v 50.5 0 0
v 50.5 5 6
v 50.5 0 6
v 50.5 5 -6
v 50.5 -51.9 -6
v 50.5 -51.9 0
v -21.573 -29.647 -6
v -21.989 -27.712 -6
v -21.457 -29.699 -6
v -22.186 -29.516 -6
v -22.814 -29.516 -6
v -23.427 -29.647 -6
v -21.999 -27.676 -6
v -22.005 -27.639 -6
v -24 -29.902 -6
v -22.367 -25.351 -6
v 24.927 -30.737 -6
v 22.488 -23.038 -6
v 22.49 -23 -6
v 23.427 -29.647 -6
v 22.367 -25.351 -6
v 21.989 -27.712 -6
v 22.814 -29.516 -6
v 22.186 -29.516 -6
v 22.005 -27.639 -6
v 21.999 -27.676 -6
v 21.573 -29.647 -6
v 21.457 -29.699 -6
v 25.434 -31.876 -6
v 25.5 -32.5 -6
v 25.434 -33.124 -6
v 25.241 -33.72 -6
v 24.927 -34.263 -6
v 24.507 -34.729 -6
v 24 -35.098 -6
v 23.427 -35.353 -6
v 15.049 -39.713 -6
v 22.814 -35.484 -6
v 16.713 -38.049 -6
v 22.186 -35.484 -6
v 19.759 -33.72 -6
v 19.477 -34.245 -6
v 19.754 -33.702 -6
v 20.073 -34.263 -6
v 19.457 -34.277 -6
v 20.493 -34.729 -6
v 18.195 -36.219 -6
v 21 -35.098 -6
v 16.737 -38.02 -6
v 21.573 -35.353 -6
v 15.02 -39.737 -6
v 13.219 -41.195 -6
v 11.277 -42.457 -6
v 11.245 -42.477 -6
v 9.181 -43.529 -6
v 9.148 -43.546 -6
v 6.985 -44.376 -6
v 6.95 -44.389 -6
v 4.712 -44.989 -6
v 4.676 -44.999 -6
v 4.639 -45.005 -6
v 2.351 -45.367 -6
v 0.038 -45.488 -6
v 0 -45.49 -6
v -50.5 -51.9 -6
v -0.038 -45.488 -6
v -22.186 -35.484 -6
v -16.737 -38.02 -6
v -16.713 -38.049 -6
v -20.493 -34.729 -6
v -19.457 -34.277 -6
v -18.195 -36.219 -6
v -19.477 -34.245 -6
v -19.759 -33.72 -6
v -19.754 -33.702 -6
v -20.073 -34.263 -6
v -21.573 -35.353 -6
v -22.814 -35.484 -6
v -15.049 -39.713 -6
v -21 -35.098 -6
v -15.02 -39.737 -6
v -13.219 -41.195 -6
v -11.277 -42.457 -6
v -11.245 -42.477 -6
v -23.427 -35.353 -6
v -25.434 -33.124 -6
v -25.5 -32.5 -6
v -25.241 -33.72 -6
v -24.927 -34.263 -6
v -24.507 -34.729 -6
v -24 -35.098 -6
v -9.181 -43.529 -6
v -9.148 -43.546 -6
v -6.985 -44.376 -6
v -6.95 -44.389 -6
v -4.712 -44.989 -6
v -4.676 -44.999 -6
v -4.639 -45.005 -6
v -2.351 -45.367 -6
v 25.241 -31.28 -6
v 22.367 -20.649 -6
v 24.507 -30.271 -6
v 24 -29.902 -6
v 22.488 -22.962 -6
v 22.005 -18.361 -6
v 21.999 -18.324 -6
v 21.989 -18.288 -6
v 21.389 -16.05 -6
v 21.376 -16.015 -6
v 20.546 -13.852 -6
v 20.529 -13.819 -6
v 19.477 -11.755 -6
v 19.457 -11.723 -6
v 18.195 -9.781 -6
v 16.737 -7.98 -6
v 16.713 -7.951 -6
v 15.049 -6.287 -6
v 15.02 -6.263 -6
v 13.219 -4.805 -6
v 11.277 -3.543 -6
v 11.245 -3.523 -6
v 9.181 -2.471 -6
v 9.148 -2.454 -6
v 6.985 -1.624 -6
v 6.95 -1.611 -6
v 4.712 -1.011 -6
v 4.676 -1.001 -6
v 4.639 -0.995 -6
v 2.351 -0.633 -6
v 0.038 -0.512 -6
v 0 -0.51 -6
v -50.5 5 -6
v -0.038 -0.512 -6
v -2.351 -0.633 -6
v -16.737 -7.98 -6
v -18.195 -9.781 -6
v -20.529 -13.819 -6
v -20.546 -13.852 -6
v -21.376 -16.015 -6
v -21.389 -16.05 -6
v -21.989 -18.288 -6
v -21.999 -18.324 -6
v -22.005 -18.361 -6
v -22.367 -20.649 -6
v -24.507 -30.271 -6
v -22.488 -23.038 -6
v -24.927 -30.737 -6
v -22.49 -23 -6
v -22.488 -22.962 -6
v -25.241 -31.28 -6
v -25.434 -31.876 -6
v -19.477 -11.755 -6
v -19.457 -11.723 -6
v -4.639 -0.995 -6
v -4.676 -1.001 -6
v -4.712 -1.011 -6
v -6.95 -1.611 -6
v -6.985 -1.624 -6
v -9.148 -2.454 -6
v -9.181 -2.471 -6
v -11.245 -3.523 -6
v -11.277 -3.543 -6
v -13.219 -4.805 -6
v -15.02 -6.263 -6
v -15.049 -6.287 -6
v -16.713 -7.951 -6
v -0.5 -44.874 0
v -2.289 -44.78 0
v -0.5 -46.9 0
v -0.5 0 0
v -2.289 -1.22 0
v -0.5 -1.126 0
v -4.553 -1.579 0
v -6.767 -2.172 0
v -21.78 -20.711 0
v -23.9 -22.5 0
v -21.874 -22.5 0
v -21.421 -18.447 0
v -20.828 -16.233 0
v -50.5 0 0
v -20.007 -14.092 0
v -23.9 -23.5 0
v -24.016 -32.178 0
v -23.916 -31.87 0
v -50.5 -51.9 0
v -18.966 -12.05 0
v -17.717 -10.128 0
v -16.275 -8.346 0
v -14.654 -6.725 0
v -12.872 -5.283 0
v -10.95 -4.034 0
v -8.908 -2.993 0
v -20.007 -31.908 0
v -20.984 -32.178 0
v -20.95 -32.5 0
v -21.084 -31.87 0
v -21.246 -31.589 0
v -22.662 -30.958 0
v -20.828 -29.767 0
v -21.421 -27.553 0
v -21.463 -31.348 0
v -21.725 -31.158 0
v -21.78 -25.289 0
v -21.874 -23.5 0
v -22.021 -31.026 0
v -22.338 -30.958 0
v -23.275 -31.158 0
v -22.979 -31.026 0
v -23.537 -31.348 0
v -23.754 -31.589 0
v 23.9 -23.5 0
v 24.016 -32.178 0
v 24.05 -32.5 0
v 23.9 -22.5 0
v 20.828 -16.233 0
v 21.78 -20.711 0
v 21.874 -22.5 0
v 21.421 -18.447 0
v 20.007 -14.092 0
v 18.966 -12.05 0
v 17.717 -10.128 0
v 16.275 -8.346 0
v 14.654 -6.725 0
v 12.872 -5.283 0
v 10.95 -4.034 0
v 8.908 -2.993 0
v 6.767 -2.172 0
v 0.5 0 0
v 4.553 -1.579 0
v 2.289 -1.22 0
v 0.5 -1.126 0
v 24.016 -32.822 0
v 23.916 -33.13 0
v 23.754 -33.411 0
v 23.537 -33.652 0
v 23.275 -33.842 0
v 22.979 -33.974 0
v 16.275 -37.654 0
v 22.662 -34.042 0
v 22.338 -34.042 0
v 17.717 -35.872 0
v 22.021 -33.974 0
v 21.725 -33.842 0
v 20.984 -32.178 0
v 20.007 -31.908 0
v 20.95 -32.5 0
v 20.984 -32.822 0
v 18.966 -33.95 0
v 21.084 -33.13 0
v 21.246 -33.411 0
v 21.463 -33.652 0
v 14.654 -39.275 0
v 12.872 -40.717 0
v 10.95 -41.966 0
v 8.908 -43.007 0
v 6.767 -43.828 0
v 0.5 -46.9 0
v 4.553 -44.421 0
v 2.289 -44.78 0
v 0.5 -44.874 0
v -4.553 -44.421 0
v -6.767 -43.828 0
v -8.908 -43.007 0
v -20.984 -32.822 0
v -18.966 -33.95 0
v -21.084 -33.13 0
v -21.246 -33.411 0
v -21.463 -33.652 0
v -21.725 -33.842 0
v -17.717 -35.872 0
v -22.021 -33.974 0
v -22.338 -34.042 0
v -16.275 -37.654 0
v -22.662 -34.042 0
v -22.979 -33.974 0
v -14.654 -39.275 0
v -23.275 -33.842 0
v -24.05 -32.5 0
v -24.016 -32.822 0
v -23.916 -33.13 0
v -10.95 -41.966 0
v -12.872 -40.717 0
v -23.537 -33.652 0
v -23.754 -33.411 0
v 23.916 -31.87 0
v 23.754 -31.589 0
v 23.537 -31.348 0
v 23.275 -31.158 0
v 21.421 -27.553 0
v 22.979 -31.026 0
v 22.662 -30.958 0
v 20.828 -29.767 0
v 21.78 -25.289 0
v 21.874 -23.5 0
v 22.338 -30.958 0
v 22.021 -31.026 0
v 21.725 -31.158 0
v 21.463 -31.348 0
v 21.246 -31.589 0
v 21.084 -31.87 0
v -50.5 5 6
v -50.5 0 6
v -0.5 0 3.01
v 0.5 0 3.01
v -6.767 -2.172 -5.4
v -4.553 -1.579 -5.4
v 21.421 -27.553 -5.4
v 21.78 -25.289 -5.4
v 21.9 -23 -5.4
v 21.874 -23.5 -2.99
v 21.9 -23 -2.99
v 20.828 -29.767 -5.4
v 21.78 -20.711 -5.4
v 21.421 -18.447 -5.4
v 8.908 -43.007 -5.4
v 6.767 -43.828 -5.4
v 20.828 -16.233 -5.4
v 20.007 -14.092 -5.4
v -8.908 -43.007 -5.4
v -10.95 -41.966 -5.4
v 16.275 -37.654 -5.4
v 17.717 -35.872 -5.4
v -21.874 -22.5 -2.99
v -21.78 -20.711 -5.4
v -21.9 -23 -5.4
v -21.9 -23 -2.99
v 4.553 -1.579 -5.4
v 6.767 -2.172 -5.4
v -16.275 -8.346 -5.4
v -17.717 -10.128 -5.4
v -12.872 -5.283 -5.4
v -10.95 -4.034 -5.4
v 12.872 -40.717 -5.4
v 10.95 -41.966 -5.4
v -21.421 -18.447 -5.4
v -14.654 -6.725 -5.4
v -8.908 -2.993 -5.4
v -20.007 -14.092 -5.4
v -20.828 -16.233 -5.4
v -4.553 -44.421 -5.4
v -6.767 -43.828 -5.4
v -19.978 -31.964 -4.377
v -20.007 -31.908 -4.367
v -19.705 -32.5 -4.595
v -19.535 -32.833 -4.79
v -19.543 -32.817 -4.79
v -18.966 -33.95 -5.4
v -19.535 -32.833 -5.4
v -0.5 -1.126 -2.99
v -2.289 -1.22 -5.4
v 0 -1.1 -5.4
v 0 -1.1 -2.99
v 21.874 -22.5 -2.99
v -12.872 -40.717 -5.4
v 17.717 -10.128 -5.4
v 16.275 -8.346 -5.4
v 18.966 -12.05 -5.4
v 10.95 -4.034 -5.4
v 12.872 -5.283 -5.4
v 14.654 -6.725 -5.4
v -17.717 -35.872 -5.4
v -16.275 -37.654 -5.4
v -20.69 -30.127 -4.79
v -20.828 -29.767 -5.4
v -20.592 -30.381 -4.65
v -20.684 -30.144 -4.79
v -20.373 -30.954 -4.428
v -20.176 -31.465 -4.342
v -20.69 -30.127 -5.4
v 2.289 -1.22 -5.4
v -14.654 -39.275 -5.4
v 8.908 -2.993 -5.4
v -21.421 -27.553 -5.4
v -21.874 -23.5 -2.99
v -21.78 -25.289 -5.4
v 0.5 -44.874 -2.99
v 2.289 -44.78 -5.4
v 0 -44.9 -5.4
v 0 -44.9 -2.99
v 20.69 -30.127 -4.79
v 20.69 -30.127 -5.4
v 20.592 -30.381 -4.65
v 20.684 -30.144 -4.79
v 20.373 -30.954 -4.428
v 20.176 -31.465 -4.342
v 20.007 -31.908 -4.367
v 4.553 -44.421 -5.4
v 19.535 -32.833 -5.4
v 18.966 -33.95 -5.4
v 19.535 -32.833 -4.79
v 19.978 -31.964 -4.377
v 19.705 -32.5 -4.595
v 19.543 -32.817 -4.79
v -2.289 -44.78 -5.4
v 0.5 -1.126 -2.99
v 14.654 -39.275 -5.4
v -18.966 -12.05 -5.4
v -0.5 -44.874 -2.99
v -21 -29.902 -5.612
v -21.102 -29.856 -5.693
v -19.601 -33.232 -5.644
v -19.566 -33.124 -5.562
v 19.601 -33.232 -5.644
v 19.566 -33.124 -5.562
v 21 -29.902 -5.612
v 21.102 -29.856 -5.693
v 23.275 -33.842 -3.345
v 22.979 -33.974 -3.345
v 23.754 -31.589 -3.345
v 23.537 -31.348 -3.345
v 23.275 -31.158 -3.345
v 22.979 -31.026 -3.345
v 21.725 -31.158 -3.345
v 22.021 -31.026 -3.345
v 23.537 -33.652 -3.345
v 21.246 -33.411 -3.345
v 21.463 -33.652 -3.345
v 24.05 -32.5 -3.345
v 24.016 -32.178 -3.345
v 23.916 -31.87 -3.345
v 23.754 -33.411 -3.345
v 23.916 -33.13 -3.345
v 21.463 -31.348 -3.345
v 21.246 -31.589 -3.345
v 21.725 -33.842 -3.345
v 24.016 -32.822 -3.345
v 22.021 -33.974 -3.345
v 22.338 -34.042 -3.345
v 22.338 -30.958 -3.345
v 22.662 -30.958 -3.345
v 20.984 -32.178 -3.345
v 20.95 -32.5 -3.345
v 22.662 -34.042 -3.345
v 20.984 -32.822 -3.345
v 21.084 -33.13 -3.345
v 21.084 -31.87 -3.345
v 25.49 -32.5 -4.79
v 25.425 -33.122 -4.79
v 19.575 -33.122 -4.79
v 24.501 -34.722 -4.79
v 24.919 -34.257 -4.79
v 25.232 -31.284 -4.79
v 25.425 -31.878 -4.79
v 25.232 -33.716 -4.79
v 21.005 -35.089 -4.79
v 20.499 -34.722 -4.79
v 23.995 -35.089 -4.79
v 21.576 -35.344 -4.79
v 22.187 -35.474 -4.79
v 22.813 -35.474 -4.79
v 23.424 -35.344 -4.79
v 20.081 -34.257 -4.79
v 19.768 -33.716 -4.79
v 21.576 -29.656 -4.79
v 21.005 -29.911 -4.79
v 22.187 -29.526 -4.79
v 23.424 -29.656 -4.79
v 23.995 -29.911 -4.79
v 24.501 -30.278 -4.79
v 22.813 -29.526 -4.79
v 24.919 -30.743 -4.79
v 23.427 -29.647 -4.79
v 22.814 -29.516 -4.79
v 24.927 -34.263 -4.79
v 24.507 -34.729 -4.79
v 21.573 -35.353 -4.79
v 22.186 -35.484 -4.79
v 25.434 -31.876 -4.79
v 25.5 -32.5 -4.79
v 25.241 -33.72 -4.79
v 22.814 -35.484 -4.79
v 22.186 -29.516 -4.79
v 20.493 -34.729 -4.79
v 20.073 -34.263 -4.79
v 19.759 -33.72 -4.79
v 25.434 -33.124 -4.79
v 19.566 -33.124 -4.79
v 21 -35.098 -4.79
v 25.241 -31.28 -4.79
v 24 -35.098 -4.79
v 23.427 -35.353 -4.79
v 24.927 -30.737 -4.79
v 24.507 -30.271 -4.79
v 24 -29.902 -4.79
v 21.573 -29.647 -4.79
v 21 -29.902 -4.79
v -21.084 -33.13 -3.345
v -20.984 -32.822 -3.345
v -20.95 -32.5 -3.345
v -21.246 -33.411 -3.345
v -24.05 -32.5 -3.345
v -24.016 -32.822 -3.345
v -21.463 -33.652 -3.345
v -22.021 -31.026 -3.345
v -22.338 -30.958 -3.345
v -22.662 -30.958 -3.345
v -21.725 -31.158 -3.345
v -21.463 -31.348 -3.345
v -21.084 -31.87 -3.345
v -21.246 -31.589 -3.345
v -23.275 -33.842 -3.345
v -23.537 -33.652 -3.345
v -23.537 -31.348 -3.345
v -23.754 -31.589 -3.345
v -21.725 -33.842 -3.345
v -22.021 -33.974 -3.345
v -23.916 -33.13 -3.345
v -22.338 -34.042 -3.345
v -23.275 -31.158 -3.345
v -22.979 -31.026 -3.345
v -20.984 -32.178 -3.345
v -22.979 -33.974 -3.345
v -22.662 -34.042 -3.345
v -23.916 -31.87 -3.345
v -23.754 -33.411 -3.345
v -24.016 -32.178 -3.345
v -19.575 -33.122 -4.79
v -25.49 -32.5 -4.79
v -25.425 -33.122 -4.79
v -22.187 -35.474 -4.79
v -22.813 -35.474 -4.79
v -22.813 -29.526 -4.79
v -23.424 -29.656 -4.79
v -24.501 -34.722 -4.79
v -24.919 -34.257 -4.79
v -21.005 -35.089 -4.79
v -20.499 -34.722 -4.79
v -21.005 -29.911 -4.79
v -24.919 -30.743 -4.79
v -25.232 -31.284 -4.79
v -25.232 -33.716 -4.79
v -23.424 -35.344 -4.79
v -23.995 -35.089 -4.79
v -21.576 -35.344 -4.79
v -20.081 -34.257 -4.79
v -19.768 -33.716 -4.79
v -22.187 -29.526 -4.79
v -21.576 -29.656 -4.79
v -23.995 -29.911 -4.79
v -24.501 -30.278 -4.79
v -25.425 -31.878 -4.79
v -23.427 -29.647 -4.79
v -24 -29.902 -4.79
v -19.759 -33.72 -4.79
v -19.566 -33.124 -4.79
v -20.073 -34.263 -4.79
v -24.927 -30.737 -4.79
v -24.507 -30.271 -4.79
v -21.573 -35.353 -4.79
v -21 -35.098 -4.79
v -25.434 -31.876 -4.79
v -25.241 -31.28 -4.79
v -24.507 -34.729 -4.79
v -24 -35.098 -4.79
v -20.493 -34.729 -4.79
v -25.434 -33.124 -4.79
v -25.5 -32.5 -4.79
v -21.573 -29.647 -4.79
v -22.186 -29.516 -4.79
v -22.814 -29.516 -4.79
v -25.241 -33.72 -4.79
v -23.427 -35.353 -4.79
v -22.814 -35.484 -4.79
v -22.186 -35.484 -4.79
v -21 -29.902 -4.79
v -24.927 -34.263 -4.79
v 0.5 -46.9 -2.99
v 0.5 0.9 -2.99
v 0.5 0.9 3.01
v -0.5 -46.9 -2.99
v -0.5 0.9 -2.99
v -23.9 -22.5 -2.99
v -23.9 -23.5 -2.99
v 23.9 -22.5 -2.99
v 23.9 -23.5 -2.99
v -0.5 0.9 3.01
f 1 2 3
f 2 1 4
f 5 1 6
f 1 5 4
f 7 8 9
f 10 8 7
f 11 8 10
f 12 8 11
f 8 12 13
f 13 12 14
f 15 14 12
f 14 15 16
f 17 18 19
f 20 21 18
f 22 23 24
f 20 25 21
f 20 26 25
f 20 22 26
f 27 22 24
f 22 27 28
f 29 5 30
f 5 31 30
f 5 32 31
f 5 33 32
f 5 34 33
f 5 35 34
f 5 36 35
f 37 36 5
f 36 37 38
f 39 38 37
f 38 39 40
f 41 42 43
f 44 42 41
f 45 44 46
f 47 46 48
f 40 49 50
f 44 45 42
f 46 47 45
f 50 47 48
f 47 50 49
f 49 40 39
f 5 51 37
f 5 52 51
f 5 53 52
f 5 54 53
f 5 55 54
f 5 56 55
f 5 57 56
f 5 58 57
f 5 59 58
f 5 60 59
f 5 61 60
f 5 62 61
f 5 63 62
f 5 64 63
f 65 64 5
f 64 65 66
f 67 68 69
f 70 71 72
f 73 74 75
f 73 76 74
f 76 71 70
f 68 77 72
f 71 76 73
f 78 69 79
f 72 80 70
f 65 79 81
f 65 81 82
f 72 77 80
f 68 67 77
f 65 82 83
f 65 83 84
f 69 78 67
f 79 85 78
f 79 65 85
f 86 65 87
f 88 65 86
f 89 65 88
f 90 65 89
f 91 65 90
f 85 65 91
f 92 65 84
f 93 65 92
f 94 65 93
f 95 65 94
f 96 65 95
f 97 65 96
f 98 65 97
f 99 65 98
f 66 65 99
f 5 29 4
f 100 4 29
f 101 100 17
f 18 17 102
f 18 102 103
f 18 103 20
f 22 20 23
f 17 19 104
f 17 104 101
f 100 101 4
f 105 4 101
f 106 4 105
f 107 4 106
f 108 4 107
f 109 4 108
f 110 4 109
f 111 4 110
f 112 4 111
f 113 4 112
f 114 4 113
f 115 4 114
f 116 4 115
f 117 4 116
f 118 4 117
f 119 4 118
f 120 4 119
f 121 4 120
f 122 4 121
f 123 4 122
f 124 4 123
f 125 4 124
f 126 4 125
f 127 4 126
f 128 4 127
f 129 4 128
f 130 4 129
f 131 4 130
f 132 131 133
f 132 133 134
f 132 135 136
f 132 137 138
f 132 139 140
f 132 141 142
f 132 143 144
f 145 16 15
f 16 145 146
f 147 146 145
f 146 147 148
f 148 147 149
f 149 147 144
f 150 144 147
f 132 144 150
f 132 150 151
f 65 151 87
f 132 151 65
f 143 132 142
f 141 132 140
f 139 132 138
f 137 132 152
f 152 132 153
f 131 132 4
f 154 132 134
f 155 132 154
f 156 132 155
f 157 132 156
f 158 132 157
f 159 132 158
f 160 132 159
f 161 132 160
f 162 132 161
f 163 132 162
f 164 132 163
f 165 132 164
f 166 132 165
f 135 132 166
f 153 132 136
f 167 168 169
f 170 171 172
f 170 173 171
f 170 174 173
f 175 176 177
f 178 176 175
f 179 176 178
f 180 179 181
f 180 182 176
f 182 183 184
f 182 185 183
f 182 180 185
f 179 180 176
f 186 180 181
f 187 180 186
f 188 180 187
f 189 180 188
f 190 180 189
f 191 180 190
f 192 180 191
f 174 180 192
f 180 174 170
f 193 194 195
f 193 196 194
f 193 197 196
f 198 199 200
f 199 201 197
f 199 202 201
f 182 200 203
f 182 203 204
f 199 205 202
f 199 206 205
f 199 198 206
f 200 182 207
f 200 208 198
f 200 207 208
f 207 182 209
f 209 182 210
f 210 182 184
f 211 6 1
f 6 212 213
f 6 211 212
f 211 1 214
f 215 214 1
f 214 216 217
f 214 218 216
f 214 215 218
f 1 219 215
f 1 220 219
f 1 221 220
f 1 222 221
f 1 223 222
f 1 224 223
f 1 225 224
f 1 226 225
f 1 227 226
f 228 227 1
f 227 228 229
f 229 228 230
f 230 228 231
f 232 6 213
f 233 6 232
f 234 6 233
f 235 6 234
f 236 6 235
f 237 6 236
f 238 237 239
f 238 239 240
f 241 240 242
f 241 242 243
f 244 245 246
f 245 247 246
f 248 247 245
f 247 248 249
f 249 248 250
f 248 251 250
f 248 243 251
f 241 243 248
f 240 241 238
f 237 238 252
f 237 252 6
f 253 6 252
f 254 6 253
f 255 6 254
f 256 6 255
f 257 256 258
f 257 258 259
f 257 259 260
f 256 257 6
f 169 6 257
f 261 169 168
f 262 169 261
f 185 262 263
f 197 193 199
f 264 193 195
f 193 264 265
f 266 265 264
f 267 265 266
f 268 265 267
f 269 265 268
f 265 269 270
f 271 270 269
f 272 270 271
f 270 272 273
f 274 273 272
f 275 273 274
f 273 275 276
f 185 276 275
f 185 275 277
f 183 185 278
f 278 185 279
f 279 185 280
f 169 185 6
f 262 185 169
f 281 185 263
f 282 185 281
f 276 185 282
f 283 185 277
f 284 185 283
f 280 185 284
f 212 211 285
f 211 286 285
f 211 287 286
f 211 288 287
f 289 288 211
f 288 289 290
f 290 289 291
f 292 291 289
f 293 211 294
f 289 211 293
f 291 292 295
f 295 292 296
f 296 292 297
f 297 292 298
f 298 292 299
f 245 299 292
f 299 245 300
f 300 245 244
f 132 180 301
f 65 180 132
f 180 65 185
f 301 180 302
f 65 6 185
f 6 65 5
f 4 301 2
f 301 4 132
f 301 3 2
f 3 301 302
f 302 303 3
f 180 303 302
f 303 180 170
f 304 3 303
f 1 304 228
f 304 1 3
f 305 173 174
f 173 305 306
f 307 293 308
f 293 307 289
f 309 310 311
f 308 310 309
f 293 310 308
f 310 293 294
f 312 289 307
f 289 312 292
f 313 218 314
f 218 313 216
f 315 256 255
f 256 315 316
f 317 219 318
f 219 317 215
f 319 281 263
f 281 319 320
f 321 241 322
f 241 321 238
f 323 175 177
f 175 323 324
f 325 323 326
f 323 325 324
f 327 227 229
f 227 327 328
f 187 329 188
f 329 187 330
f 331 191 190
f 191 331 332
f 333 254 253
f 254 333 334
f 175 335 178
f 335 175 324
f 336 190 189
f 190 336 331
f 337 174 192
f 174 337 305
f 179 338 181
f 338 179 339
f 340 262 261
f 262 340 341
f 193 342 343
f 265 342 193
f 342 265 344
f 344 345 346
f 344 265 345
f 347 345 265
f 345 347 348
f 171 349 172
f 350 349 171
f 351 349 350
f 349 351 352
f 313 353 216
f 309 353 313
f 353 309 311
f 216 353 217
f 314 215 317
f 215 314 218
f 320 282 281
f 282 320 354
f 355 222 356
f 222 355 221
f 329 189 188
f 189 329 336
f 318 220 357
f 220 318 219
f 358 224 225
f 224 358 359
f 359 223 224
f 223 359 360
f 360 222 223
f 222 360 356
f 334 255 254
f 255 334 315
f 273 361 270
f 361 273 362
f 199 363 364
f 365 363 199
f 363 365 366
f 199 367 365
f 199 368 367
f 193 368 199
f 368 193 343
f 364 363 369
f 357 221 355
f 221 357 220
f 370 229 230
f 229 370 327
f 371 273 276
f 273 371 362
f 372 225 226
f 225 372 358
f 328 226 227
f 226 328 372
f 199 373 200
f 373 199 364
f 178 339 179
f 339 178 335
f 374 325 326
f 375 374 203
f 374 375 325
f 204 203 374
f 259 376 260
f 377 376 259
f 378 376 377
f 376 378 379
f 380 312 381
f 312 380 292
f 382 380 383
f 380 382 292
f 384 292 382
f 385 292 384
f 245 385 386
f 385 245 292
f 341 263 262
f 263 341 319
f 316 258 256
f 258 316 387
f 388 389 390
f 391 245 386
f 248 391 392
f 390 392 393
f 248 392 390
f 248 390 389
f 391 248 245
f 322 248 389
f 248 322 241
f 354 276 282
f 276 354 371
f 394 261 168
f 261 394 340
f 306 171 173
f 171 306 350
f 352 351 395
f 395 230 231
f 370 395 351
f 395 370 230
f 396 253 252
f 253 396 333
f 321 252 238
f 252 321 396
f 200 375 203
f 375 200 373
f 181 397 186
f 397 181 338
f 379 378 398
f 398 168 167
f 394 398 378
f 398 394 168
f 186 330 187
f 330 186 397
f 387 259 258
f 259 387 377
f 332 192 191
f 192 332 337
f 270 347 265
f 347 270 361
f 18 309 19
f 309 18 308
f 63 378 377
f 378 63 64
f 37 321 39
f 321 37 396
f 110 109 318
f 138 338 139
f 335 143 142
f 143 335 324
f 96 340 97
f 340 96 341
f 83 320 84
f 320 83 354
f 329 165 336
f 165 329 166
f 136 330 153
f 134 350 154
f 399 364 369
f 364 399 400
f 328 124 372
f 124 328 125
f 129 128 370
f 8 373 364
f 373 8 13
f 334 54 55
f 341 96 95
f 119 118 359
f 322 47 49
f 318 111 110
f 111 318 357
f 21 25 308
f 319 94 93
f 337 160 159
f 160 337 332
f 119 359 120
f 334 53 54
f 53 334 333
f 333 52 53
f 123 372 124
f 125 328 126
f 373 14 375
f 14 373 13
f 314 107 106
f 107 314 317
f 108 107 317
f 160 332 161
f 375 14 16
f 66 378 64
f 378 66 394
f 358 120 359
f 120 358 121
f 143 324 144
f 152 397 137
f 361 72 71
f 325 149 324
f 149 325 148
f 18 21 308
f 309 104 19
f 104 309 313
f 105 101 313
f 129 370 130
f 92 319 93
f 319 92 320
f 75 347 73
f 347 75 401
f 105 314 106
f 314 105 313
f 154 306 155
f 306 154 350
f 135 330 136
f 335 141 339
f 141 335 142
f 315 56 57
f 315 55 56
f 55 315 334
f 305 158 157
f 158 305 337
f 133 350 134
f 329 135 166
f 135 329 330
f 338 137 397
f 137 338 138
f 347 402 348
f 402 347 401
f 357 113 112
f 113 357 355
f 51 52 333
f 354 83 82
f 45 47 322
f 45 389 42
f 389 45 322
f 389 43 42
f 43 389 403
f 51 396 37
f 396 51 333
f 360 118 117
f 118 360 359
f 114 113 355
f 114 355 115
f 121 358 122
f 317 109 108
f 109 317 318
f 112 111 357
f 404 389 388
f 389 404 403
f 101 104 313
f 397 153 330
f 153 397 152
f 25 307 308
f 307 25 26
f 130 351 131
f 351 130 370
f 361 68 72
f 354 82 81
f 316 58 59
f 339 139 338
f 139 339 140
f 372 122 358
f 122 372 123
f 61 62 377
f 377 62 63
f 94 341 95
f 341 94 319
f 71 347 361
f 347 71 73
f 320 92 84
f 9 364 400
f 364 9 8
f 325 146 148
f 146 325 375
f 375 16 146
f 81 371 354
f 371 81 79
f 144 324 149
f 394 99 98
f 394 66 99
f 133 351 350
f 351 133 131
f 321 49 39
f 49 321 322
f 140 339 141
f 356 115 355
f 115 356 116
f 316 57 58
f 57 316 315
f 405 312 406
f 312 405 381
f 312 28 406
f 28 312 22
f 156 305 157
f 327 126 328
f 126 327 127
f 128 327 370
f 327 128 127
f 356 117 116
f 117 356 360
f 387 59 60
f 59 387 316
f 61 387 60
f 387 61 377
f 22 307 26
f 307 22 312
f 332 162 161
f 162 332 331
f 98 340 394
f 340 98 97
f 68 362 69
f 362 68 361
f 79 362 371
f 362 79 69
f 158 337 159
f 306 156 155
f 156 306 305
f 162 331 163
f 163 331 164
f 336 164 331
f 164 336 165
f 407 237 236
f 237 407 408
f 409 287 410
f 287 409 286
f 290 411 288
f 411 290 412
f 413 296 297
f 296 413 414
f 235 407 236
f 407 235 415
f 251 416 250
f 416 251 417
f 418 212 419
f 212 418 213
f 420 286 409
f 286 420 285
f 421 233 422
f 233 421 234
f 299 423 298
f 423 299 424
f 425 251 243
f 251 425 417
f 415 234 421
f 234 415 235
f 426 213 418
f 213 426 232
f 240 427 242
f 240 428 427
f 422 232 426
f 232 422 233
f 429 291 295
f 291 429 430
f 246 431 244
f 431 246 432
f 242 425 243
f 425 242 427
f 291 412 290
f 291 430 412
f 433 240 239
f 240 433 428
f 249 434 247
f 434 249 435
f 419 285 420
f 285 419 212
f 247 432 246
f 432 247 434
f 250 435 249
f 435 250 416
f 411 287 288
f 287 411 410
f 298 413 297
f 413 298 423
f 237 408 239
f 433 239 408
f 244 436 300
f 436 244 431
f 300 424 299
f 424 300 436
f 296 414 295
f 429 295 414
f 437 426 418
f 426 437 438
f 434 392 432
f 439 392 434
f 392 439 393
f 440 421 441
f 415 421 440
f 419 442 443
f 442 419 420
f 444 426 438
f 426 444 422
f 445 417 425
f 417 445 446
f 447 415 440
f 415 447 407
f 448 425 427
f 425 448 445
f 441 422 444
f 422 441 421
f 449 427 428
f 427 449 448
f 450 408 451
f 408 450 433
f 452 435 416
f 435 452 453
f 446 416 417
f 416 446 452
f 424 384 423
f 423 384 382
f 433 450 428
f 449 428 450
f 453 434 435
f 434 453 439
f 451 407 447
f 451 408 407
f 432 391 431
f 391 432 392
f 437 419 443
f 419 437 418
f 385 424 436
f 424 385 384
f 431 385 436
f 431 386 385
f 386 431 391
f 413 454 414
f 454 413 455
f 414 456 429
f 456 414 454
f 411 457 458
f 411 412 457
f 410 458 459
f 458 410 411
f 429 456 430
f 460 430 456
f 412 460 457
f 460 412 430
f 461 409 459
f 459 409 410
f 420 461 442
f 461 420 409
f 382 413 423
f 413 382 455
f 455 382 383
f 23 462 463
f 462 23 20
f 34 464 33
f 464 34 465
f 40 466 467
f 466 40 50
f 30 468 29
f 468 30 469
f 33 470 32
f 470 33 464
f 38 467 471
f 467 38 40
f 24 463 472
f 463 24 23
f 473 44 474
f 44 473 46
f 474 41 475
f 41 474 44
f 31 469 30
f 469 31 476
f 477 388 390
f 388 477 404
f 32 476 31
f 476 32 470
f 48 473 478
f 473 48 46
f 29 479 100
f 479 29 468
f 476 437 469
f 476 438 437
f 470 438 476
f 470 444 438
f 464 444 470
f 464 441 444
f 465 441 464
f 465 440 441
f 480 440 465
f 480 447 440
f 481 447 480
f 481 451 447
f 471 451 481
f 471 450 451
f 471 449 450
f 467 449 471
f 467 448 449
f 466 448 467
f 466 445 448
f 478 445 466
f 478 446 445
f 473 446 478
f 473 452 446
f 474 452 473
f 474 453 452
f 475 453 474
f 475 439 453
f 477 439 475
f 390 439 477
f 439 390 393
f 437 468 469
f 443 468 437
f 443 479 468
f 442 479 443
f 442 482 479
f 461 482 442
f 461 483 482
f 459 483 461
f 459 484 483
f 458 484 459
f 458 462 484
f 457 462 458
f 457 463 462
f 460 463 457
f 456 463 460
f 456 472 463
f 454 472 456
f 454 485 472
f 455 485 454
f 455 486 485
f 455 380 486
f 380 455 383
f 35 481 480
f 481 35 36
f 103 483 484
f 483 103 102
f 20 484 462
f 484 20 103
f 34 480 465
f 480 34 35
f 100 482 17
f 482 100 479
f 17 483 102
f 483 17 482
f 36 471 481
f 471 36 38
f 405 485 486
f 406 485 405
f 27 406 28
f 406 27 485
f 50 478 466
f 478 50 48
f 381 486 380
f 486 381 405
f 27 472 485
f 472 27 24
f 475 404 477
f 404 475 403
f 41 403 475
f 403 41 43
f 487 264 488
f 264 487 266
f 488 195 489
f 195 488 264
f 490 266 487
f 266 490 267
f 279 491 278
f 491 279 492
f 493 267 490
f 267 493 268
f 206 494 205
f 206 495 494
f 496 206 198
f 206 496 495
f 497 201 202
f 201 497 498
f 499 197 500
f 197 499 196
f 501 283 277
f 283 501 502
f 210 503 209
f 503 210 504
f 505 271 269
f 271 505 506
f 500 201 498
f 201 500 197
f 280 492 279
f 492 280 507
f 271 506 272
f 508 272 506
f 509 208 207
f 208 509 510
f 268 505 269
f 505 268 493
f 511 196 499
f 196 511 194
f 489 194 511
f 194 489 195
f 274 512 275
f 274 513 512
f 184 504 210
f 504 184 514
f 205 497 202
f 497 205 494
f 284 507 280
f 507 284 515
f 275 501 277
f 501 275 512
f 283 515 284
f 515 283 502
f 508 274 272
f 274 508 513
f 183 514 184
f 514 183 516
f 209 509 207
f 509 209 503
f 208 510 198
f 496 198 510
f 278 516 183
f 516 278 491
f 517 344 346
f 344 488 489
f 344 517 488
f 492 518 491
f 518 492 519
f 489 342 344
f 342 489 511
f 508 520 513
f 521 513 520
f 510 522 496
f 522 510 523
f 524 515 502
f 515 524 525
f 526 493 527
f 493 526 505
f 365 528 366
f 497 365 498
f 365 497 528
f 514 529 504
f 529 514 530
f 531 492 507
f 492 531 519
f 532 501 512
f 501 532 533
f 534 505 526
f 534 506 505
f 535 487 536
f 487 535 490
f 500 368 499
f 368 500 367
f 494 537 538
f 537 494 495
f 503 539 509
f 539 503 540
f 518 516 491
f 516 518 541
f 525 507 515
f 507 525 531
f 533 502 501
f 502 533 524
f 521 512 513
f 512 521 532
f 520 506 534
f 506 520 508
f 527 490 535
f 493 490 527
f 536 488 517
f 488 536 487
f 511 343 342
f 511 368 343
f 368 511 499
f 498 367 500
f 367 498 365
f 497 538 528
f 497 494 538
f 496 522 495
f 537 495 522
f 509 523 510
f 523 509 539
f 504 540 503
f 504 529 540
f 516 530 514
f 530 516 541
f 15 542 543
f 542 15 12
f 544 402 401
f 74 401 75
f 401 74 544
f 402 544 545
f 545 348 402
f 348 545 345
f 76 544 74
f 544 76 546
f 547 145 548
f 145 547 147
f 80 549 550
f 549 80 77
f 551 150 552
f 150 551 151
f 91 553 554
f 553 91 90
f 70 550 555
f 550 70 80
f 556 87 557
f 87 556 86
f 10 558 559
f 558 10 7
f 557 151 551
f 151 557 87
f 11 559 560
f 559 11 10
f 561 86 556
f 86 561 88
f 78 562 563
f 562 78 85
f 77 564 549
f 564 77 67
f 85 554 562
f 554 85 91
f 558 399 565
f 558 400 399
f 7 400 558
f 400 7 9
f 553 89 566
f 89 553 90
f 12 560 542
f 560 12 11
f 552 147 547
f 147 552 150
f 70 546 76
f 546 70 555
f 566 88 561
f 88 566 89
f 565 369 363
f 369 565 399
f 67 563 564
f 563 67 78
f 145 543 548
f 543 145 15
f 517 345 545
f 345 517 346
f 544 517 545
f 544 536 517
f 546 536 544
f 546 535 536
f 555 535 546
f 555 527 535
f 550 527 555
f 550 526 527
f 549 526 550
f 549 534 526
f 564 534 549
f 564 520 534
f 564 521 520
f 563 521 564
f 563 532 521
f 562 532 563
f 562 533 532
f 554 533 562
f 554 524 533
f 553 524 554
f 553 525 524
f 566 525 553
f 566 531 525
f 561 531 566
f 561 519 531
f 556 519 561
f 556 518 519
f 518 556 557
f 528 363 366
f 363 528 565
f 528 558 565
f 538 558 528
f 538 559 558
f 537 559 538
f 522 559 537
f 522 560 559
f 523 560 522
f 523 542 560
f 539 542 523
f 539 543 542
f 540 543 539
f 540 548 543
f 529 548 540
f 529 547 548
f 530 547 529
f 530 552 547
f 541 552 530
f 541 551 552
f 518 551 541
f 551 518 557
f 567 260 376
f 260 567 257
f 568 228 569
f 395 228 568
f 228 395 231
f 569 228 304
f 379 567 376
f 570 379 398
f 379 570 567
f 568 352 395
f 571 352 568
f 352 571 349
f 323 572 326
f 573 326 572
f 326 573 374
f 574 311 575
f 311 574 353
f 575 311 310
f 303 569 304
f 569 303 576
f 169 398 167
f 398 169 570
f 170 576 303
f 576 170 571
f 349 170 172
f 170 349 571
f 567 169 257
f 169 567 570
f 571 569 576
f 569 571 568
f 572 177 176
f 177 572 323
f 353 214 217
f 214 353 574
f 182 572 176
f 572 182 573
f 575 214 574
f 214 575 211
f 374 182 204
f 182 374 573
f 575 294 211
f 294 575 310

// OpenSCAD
//
//  router pattern jig for concealed cabinet hinge mount
//
//  design by egil kvaleberg, 3 dec 2015
//
//  bug: 
//

// size of milling bit used on router
mill_dia = 9.5;  

// diameter of guide on router
guide_dia = 18.3; 

// jig main thickness 
guide_height = 6.0;

// width of support bar
guide_bar = 5.0; 

// chamfer of jig hole
guide_chamfer = 0.6; 

// hole in router plastic support plate, decides jig height
platform_dia = 60.0; 

// hole for hinge, usually 35, but 25 also exists
hinge_dia = 35.0; 

// hole centre offset to door edge, decides gap (20.5 to 24.5)
hinge_offset = 23.0; 

// hinge mount screw distance, usually 42, 45 or 48 
screw_dist = 45.0; 

// from hole centre, valid for 35mm hinge
screw_offset = 9.5; 

// for pilot drill and jig fixing screw, final hole should be approx 4.0
screw_dia = 3.1; 

// size of head of screw for temporary jig fixing
screw_head = 6.0; 

// width of notch indicating centre
index_notch = 1.0; 

/* [Hidden] */
tool_offset = (guide_dia-mill_dia)/2;
tool_dia = hinge_dia+tool_offset*2; // diameter of hole in tool
tool_height = max(platform_dia + hinge_dia + 6.0, hinge_dia+2*tool_offset+2*guide_bar); // make sure jig supports router plastic support plate
tool_width = hinge_offset+tool_dia/2+2*guide_height;

d = 0.01;

module tool() {
    translate([-tool_height/2, -guide_bar, 0]) cube(size=[tool_height, tool_width, guide_height]);
    translate([-tool_height/2, -guide_bar, -guide_height]) cube(size=[tool_height, guide_bar, guide_height+d]);
}

module hingehole() {
    translate([0, hinge_offset, -d]) {
        cylinder(d=tool_dia, h=guide_height+2*d, $fn=60);
        translate([0, 0, d+guide_height-guide_chamfer]) 
            cylinder(d1=tool_dia, d2=tool_dia+2*guide_chamfer, h=guide_chamfer+d, $fn=60);
    }
}

module screwholes() {
    recess = guide_height/5;
    for (s = [1, -1]) translate([s*screw_dist/2, hinge_offset+screw_offset, -d]) {
            cylinder(d=screw_dia, h=guide_height+2*d, $fn=30);
            translate([0, 0, guide_height-screw_head/2-recess]) cylinder(d1=0, d2=screw_head, h=screw_head/2+d, $fn=30);
            translate([0, 0, guide_height-recess]) cylinder(d=screw_head, h=recess+2*d, $fn=30);
    }
}

module index() {
    translate([0, hinge_offset, -d]) {
        for (a = [0, 90]) rotate([0, 0, a])
        cube(size=[index_notch, tool_dia+4*index_notch, guide_height], center=true); 
    }
}

rotate([180,0,0]) // for printing
difference () {
    tool();
    union () {
        hingehole();
        screwholes();
        index();
    }
}
